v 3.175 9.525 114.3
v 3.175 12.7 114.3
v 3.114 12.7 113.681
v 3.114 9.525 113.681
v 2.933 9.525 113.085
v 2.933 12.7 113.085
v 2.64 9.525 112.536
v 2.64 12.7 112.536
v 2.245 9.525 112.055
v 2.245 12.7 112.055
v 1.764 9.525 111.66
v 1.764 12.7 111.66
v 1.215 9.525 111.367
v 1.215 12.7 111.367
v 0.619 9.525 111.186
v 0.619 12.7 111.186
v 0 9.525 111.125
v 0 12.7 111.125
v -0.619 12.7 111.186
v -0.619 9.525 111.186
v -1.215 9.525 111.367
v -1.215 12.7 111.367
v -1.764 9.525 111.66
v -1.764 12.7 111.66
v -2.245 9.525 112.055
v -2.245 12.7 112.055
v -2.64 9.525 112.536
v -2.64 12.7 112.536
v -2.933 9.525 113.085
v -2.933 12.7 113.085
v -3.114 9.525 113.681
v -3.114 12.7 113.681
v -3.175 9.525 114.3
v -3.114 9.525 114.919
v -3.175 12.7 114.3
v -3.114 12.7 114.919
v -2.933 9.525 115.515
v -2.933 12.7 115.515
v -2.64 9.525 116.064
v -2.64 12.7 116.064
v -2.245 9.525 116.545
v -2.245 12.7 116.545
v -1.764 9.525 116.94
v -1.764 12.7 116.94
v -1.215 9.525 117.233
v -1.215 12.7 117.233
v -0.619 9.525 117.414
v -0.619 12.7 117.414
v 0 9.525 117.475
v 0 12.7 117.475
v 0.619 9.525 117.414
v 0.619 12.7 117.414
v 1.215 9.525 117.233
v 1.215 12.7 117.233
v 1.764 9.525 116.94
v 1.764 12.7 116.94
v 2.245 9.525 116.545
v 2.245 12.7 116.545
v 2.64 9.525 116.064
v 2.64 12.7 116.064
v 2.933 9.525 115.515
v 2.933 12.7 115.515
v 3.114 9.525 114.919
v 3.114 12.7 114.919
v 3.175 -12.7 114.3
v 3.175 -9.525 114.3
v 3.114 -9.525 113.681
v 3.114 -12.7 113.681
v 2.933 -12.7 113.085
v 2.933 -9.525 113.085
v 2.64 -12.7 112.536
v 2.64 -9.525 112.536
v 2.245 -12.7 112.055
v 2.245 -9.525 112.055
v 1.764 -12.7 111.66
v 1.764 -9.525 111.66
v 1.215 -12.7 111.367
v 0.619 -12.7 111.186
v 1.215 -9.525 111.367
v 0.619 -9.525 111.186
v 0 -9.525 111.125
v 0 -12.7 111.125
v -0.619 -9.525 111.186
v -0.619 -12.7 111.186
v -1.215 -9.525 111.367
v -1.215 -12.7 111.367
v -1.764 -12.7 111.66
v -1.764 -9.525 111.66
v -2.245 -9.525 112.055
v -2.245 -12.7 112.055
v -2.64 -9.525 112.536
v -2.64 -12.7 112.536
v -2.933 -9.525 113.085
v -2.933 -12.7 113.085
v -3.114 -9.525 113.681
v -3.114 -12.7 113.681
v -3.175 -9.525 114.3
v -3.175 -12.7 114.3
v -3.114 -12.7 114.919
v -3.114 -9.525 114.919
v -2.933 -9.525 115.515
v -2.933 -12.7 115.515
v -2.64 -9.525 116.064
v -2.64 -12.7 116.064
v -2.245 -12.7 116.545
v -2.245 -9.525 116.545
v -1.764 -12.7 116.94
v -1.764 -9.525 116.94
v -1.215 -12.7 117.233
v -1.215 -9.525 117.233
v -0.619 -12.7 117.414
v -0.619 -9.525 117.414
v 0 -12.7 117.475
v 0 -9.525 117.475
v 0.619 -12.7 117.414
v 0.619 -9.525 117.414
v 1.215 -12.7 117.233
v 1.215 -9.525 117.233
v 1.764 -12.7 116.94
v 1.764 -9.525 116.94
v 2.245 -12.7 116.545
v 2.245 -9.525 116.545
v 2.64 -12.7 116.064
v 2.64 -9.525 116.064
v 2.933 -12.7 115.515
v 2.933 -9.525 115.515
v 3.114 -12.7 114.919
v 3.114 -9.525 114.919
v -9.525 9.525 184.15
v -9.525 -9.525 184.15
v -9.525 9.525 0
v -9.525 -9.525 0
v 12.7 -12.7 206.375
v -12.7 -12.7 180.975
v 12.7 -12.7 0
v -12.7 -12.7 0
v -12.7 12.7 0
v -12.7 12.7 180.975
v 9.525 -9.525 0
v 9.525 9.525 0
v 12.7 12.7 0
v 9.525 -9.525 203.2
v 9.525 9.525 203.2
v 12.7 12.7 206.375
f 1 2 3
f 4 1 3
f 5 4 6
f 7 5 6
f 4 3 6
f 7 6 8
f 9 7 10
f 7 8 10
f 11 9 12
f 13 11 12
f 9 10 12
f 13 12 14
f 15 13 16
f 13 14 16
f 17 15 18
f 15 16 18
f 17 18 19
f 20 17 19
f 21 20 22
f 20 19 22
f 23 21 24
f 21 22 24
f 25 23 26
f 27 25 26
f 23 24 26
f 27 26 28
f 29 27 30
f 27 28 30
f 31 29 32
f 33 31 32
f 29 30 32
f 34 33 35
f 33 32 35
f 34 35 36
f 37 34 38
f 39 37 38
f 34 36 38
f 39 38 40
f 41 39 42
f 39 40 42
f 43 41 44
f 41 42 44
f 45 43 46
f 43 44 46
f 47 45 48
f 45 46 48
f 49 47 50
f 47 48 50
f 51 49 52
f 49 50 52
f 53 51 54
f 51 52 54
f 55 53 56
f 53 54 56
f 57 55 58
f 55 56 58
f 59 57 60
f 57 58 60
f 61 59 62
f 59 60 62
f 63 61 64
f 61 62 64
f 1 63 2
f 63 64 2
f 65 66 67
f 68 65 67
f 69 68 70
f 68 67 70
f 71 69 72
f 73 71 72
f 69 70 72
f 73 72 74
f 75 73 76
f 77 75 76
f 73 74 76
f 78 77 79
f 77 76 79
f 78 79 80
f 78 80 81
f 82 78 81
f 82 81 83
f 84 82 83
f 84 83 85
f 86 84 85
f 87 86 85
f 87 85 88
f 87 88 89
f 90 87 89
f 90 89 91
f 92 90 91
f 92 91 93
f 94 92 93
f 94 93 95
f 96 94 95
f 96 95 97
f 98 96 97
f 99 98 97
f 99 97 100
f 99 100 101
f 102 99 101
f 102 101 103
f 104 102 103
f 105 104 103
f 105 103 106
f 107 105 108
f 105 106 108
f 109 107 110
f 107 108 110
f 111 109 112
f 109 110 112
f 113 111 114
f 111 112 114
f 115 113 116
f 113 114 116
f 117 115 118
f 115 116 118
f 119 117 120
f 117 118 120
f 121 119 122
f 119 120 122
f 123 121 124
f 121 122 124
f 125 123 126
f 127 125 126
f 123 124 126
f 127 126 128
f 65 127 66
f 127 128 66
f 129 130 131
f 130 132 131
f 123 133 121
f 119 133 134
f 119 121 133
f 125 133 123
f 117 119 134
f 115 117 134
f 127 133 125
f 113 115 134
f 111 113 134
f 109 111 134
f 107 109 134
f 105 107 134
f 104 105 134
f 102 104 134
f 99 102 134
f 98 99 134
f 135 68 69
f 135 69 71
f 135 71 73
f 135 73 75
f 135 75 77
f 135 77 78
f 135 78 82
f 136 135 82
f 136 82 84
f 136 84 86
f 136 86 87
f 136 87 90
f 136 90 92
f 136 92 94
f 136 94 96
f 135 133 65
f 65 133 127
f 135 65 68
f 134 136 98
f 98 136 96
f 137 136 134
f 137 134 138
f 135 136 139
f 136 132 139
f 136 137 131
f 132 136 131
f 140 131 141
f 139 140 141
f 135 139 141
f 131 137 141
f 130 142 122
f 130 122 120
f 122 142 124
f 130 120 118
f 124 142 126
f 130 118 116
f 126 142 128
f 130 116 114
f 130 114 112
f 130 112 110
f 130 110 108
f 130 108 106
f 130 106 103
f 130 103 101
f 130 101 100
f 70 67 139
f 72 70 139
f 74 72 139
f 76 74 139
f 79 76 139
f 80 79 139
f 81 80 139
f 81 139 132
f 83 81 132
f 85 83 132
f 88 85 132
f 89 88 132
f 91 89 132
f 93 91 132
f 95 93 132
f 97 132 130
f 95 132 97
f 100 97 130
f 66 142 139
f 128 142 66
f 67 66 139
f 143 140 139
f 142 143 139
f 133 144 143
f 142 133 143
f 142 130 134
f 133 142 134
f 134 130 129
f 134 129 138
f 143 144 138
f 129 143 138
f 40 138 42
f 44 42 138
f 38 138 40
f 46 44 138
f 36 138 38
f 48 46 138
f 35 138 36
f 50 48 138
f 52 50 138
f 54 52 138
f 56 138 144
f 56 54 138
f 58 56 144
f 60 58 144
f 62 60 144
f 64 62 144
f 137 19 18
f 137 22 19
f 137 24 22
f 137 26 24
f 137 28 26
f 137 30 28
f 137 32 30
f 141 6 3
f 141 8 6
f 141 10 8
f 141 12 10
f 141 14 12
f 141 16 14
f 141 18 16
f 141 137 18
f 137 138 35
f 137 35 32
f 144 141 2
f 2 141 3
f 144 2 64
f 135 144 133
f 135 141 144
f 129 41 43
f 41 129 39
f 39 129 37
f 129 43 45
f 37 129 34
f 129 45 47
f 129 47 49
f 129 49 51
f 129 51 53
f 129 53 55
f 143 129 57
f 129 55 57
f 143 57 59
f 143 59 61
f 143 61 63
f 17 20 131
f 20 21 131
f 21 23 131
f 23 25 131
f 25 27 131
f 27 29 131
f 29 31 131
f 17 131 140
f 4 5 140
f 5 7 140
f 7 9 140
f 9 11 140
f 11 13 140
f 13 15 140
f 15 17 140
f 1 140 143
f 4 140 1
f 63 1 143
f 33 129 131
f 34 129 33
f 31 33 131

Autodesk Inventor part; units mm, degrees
ref_plane "YZ Plane" through (0, 0, 0) normal (1, 0, 0) x (0, 1, 0)
ref_plane "XZ Plane" through (0, 0, 0) normal (0, 1, 0) x (-1, 0, 0)
ref_plane "XY Plane" through (0, 0, 0) normal (0, 0, 1) x (1, 0, 0)
sketch "Sketch1" plane through (0, 0, 0) normal (0, 0, 1) x (1, 0, 0)
  line L0 (-12.7, 12.7) -> (12.7, 12.7)
  line L1 (12.7, 12.7) -> (12.7, -12.7)
  line L2 (12.7, -12.7) -> (-12.7, -12.7)
  line L3 (-12.7, -12.7) -> (-12.7, 12.7)
  line L4 (-9.525, 9.525) -> (9.525, 9.525)
  line L5 (9.525, 9.525) -> (9.525, -9.525)
  line L6 (9.525, -9.525) -> (-9.525, -9.525)
  line L7 (-9.525, -9.525) -> (-9.525, 9.525)
  point P0 (0, 0)
  dimension "d0" = 25.4
  dimension "d1" = 25.4
  dimension "d2" = 12.7
  dimension "d3" = 12.7
  dimension "d4" = 3.175
  dimension "d5" = 3.175
  dimension "d6" = 3.175
  dimension "d7" = 3.175
extrude "Extrusion1" add sketch "Sketch1" along normal blind 206.375
sketch "Sketch4" plane through (-12.7, 12.7, 0) normal (0, 1, 0) x (1, 0, 0)
  line L0 (0, -206.375) -> (25.4, -206.375) projected
  line L1 (0, 0) -> (0, -206.375) projected
  line L2 (25.4, -206.375) -> (0, -180.975)
  point P0 (12.7, 0)
  dimension "d16" = 45
extrude "Extrusion4" cut sketch "Sketch4" against normal blind 25.4
sketch "Sketch5" plane through (-12.7, 12.7, 0) normal (0, 1, 0) x (1, 0, 0)
  line L0 (25.4, 0) -> (25.4, -206.375) projected
  line L1 (0, 0) -> (25.4, 0) projected
  circle A0 centre (12.7, -114.3) radius 3.175
  point P0 (12.7, 0)
  dimension "d19" = 114.3
  dimension "d20" = 12.7
  dimension "d21" = 6.35
extrude "Extrusion5" cut sketch "Sketch5" against normal blind 25.4
properties part number "edge frame tube1"
